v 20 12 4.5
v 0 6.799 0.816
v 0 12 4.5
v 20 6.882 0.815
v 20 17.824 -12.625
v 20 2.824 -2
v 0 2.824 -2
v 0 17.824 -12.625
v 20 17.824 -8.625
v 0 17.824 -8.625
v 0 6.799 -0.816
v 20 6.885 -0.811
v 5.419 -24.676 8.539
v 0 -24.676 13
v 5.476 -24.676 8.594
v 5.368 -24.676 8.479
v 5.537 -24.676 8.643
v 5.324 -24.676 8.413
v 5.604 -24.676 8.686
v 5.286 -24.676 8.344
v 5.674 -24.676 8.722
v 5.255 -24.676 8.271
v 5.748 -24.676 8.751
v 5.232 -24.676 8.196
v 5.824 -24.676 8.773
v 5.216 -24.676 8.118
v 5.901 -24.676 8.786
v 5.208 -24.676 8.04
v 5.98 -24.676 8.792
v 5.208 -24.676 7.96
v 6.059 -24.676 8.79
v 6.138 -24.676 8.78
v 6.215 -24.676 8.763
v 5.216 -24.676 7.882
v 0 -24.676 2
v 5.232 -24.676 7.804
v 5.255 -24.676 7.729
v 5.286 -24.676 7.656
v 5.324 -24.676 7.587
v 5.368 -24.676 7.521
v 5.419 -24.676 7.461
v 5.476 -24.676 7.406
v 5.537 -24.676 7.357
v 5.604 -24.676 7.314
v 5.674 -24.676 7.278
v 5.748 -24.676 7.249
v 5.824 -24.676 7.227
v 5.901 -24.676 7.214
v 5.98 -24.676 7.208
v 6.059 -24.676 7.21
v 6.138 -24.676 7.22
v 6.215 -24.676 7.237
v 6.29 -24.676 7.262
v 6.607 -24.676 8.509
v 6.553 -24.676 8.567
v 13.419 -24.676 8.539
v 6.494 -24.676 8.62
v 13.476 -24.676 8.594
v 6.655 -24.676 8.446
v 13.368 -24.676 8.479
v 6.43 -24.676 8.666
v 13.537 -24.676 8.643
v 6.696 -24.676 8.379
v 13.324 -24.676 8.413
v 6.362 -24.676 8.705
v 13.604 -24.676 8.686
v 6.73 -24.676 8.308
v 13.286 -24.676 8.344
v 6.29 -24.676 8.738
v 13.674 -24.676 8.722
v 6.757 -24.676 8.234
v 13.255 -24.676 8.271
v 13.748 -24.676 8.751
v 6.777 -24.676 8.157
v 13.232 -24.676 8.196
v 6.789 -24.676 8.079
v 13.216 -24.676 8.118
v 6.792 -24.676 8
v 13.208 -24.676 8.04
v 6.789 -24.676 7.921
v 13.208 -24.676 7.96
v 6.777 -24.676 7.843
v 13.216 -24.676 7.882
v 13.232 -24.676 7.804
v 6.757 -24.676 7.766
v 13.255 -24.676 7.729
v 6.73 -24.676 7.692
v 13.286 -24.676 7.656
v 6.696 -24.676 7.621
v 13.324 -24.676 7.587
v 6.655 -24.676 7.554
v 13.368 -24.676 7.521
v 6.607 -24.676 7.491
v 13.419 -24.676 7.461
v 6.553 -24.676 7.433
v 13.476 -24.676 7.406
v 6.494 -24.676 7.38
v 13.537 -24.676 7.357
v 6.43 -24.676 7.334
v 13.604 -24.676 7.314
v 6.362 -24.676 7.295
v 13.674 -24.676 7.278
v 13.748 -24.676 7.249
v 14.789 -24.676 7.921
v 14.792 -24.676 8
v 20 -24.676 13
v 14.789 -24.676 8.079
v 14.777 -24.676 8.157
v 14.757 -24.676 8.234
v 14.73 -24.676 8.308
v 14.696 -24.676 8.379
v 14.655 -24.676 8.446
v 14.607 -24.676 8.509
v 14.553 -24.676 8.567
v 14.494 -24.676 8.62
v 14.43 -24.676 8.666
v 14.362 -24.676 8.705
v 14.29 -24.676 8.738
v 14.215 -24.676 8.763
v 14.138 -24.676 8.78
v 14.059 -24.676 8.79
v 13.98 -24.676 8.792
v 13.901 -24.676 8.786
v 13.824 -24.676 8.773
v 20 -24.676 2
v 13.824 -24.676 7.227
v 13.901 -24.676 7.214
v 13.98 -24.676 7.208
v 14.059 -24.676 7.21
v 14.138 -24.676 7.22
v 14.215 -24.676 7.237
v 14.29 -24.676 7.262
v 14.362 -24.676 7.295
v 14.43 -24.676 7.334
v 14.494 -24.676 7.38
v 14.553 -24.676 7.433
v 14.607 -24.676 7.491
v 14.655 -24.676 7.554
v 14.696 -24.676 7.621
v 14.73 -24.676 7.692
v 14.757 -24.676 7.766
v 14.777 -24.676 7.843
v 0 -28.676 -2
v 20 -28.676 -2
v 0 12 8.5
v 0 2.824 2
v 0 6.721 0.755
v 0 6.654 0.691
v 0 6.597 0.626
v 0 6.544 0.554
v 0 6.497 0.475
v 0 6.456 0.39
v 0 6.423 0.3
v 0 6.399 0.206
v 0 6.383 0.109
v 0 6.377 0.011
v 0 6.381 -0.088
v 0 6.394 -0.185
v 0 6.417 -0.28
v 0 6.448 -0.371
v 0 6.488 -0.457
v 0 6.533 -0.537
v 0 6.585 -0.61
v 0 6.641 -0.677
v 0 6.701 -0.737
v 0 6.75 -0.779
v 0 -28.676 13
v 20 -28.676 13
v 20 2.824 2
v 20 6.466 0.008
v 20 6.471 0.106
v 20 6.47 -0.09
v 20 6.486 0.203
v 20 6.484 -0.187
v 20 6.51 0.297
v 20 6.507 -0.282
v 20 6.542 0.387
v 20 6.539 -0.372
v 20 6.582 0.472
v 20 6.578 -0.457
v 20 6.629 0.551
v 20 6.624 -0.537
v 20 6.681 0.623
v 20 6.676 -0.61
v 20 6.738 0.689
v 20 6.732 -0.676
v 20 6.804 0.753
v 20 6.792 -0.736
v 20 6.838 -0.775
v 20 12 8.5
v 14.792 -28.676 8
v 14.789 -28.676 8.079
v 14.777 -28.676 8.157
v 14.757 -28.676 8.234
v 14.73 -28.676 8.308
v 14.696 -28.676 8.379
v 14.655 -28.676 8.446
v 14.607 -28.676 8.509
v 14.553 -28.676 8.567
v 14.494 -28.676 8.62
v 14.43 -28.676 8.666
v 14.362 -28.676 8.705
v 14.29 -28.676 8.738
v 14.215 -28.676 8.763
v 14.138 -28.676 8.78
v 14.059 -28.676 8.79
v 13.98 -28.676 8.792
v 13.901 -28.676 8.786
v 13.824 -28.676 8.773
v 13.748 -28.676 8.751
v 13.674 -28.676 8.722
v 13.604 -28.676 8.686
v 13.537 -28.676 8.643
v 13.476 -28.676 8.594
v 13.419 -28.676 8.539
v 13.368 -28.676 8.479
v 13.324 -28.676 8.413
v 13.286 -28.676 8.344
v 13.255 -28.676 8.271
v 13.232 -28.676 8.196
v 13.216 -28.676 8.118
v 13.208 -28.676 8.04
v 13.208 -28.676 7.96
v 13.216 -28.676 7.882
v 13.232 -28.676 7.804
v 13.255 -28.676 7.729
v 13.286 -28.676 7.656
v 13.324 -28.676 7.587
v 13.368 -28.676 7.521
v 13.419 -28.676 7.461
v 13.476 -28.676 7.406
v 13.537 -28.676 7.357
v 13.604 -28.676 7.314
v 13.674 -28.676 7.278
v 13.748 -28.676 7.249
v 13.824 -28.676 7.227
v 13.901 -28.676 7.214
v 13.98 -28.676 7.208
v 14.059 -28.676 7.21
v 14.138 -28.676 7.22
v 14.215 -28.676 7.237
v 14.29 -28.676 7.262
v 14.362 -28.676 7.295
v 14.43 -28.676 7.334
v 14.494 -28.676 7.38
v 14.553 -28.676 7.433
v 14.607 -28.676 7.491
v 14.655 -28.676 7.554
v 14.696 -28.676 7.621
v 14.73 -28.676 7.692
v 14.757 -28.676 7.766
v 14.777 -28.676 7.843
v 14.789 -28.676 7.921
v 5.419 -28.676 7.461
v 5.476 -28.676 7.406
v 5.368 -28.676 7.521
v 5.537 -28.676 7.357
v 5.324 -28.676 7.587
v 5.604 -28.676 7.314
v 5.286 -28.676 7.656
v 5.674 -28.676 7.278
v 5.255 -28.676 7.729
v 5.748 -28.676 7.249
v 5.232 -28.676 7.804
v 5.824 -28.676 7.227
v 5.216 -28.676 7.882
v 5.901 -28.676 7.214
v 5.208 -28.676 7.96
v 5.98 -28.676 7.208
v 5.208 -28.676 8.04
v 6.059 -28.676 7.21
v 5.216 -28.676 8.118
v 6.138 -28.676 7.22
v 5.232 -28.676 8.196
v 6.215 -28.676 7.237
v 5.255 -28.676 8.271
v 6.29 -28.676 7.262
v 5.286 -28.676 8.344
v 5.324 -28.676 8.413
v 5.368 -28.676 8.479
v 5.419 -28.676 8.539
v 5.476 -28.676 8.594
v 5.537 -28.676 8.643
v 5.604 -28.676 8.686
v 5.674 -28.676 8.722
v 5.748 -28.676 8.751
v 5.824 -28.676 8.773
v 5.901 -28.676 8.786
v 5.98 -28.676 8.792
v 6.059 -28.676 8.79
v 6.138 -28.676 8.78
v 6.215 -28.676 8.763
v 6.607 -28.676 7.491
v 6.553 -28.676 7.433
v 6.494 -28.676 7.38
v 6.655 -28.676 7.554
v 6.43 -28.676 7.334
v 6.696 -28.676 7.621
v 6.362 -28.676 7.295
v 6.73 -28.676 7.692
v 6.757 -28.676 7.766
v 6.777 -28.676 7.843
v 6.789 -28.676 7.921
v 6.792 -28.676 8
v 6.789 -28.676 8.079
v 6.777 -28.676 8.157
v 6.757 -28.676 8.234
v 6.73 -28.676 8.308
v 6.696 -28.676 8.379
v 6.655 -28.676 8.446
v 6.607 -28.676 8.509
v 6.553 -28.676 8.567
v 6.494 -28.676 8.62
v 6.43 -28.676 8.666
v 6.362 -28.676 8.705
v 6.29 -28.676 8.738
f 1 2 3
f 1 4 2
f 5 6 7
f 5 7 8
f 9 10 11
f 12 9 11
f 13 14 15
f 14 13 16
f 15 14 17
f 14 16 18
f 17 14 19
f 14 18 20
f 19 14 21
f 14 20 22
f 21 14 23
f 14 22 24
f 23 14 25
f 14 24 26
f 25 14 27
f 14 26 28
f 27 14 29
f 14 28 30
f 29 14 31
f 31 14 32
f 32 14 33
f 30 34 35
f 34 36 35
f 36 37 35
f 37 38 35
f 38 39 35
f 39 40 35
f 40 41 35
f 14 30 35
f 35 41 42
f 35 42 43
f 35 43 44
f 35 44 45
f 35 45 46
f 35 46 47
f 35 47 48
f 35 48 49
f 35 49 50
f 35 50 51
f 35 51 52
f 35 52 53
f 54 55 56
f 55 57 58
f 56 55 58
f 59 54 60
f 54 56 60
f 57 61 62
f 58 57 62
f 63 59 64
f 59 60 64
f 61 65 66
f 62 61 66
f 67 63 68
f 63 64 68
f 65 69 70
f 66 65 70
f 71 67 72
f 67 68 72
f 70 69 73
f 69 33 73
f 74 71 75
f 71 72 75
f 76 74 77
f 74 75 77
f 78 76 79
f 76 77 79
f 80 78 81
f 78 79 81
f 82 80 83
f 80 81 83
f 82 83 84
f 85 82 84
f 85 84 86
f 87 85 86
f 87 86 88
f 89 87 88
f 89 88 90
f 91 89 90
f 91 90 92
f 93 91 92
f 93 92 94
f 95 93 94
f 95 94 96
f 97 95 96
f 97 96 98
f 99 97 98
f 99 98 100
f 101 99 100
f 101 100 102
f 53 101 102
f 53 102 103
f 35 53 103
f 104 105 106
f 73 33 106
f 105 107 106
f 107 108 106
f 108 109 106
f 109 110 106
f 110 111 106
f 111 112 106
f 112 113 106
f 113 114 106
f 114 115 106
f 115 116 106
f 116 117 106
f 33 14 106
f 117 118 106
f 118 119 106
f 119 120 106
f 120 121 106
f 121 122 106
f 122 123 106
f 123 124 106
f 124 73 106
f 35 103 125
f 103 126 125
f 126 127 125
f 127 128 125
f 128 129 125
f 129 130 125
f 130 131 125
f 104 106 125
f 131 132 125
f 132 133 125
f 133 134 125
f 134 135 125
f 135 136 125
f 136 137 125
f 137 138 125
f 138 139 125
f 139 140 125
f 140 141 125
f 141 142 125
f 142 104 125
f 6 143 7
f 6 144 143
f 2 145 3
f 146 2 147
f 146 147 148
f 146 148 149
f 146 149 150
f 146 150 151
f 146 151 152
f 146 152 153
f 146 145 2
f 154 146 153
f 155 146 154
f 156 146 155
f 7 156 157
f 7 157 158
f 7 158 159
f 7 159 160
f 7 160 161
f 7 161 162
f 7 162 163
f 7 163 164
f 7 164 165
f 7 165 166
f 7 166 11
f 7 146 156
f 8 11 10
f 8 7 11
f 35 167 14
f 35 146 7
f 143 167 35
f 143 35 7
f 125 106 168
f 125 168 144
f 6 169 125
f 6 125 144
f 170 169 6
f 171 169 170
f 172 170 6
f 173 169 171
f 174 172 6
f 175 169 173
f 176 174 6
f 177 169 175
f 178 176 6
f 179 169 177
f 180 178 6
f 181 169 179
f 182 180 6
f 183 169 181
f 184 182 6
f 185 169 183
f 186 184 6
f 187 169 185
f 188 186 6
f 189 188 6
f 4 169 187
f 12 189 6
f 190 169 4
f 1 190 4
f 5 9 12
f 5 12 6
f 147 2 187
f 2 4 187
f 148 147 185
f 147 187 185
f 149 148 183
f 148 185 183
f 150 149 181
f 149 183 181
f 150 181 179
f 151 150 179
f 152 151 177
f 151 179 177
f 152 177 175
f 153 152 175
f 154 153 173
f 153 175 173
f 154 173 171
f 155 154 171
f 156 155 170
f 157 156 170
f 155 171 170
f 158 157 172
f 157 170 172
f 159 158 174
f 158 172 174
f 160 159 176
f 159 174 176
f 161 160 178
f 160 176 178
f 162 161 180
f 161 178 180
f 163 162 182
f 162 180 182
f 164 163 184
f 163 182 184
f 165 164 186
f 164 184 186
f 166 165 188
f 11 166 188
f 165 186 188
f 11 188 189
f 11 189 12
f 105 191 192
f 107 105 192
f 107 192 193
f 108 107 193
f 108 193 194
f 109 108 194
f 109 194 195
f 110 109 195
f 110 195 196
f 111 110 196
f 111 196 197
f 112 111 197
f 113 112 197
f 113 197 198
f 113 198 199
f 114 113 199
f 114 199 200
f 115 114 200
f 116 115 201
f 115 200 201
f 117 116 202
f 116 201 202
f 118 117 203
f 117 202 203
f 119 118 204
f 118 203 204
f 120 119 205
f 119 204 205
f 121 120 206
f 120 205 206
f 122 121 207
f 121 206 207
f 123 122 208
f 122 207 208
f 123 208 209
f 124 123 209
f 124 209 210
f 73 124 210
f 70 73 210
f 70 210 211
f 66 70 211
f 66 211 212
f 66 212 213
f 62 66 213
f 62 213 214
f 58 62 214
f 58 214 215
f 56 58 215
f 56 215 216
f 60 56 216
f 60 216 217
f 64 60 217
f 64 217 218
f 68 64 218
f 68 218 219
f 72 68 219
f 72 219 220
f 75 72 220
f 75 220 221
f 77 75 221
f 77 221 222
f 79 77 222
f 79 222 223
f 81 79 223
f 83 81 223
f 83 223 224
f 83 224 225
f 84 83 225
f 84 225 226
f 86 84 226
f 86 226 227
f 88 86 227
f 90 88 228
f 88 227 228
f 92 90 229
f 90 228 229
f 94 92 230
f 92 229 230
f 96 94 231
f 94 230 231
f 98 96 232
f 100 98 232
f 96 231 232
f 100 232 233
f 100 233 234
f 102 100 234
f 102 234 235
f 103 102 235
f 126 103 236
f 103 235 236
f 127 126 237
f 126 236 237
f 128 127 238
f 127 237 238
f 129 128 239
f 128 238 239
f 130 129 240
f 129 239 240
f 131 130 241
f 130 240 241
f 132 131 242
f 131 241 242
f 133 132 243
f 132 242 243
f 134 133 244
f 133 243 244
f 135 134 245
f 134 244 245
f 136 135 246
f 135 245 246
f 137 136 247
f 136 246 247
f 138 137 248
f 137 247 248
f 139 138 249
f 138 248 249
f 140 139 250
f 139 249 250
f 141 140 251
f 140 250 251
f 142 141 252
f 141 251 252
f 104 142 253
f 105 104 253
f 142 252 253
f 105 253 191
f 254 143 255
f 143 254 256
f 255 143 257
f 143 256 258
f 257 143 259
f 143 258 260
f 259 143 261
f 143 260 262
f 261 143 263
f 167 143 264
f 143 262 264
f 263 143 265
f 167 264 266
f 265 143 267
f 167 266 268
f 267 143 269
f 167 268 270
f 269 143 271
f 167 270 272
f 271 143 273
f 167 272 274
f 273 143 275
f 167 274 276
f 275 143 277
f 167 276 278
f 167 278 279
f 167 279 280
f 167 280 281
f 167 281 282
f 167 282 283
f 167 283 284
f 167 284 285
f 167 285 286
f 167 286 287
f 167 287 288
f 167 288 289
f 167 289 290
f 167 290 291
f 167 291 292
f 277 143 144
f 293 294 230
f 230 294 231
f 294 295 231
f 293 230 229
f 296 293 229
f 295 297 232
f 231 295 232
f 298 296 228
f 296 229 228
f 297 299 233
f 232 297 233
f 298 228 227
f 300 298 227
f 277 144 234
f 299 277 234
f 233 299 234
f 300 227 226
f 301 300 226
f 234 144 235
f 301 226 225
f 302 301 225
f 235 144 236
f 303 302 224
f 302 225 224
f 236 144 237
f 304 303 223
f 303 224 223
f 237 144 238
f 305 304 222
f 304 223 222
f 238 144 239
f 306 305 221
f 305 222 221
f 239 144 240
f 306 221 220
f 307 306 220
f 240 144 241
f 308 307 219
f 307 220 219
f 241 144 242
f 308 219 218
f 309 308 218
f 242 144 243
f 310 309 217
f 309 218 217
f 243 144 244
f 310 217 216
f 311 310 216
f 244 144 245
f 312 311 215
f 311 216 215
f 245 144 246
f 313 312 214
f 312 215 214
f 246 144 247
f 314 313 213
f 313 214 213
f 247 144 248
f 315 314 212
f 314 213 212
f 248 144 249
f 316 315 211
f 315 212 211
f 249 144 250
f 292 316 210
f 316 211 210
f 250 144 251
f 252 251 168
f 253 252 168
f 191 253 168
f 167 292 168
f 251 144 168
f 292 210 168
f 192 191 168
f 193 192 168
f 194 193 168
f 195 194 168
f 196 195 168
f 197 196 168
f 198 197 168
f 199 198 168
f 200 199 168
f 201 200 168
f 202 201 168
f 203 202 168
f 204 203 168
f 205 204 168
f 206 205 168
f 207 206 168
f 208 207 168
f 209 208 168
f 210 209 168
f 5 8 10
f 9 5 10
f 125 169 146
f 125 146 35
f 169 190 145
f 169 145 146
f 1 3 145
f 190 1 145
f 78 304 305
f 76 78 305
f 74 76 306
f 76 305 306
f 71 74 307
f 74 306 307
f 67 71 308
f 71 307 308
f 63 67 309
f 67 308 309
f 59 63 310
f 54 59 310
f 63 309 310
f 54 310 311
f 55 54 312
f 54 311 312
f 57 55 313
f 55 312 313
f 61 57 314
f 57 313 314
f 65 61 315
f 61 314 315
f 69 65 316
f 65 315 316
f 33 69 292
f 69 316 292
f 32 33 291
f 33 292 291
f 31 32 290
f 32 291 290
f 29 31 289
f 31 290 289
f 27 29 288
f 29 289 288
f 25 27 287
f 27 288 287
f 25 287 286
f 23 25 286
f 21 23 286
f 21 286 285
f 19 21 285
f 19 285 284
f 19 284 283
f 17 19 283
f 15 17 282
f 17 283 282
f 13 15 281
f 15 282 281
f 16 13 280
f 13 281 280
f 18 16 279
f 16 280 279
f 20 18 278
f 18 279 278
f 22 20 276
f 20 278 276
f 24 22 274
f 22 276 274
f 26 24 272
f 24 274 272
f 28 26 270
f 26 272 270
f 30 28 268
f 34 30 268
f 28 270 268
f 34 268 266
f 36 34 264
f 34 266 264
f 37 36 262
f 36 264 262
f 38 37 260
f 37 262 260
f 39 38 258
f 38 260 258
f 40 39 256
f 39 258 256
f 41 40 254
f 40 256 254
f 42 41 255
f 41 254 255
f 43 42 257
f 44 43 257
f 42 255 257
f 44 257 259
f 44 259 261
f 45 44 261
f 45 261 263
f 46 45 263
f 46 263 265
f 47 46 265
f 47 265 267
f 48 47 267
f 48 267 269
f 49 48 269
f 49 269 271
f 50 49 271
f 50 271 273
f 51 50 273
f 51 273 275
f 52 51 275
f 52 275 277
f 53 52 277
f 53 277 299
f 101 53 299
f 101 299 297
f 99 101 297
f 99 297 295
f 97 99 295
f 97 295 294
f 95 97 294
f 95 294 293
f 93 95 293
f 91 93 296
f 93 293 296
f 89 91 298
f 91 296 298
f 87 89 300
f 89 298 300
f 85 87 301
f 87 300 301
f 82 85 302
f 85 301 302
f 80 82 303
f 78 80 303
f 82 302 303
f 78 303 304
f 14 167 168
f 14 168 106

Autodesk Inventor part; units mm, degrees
ref_plane "XZ Plane" through (0, 0, 0) normal (0, 1, 0) x (-1, 0, 0)
ref_plane "XY Plane" through (0, 0, 0) normal (0, 0, 1) x (1, 0, 0)
sketch "Sketch1" plane through (0, 0, 0) normal (1, 0, 0) x (0, 1, 0)
  line L0 (12, 4.5) -> (12, 8.5)
  line L1 (2.8235, 2) -> (12, 8.5)
  line L2 (17.8235, -12.625) -> (2.8235, -2)
  line L3 (0, 0) -> (0, 2)
  line L4 (0, 2) -> (2.8235, 2)
  line L5 (0, 0) -> (0, -2)
  line L6 (0, -2) -> (2.8235, -2)
  line L7 (12, 4.5) -> (5.6471, 0)
  line L8 (17.8235, -12.625) -> (17.8235, -8.625)
  line L9 (5.6471, 0) -> (17.8235, -8.625)
  dimension "d7" = 12
  dimension "d9" = 2
  dimension "d10" = 2
  dimension "d12" = 4
  dimension "d26" = 9.1765
  dimension "d27" = 6.3529
  dimension "d53" = 70.622
  dimension "d55" = 144.689
  dimension "d56" = 15
ref_plane "Work Plane1" through (20, 0, 0) normal (1, 0, 0) x (0, 1, 0)
sketch "Sketch2" plane through (20, 0, 0) normal (1, 0, 0) x (0, 1, 0)
  line L0 (12, 4.5) -> (12, 8.5) projected
  line L1 (12, 4.5) -> (5.6471, 0) projected
  line L2 (2.8235, 2) -> (12, 8.5) projected
  line L3 (17.8235, -12.625) -> (2.8235, -2) projected
  line L4 (0, 2) -> (2.8235, 2) projected
  line L5 (0, 0) -> (0, 2) projected
  line L6 (0, 0) -> (0, -2) projected
  line L7 (0, -2) -> (2.8235, -2) projected
  line L8 (5.75, 0) -> (12, 4.5)
  line L9 (17.8235, -12.625) -> (2.8235, -2)
  line L10 (0, -2) -> (2.8235, -2)
  line L11 (0, -2) -> (0, 2)
  line L12 (0, 2) -> (2.8235, 2)
  line L13 (2.8235, 2) -> (12, 8.5)
  line L14 (12, 8.5) -> (12, 4.5)
  line L15 (17.8235, -12.625) -> (17.8235, -8.625)
  line L16 (17.8235, -8.625) -> (5.75, 0)
  dimension "d19" = 0.1029
  dimension "d57" = 4
  dimension "d58" = 71.295
loft "Loft1" add profiles "Sketch1", "Sketch2"
fillet "Fillet1" radius 1 1 edges at (10, 5.6985, 0)
sketch "Sketch3" plane through (20, 0, -2) normal (1, 0, 0) x (0, 0, -1)
  line L0 (-4, 2.8235) -> (-10.5, 12) projected
  line L1 (-4, 2.8235) -> (0, 2.8235)
  line L2 (0, 2.8235) -> (0, -28.6765)
  line L3 (0, -28.6765) -> (-4, -28.6765)
  line L4 (-4, -24.6765) -> (-4, 2.8235)
  line L5 (0, -28.6765) -> (-15, -28.6765)
  line L6 (-15, -28.6765) -> (-15, -24.6765)
  line L7 (-15, -24.6765) -> (-4, -24.6765)
  line L8 (0, -24.6765) -> (0, -28.6765)
  point P0 (-2, 0)
  dimension "d35" = 31.5
  dimension "d36" = 4
  dimension "d37" = 15
  dimension "d38" = 4
  dimension "d39" = 11
extrude "Extrusion2" add sketch "Sketch3" against normal up to surface (20 mm away)
sketch "Sketch4" plane through (20, -28.6765, -2) normal (0, -1, 0) x (1, 0, 0)
  line L0 (0, 15) -> (-20, 15) projected
  line L1 (-20, 0) -> (-20, 15) projected
  line L2 (0, 0) -> (0, 15) projected
  circle A0 centre (-14, 10) radius 0.7925
  circle A1 centre (-6, 10) radius 0.7925
  point P0 (-20, 2)
  dimension "d44" = 5
  dimension "d45" = 6
  dimension "d46" = 6
  dimension "d48" = 5
  dimension "d49" = 1.585
  dimension "d50" = 1.585
extrude "Extrusion3" cut sketch "Sketch4" against normal blind 10
equation "\"d19\" = d15"
equation "\"d50\" = d49"
equation "\"d15\" = 0.102953"
properties part number "stopper"
